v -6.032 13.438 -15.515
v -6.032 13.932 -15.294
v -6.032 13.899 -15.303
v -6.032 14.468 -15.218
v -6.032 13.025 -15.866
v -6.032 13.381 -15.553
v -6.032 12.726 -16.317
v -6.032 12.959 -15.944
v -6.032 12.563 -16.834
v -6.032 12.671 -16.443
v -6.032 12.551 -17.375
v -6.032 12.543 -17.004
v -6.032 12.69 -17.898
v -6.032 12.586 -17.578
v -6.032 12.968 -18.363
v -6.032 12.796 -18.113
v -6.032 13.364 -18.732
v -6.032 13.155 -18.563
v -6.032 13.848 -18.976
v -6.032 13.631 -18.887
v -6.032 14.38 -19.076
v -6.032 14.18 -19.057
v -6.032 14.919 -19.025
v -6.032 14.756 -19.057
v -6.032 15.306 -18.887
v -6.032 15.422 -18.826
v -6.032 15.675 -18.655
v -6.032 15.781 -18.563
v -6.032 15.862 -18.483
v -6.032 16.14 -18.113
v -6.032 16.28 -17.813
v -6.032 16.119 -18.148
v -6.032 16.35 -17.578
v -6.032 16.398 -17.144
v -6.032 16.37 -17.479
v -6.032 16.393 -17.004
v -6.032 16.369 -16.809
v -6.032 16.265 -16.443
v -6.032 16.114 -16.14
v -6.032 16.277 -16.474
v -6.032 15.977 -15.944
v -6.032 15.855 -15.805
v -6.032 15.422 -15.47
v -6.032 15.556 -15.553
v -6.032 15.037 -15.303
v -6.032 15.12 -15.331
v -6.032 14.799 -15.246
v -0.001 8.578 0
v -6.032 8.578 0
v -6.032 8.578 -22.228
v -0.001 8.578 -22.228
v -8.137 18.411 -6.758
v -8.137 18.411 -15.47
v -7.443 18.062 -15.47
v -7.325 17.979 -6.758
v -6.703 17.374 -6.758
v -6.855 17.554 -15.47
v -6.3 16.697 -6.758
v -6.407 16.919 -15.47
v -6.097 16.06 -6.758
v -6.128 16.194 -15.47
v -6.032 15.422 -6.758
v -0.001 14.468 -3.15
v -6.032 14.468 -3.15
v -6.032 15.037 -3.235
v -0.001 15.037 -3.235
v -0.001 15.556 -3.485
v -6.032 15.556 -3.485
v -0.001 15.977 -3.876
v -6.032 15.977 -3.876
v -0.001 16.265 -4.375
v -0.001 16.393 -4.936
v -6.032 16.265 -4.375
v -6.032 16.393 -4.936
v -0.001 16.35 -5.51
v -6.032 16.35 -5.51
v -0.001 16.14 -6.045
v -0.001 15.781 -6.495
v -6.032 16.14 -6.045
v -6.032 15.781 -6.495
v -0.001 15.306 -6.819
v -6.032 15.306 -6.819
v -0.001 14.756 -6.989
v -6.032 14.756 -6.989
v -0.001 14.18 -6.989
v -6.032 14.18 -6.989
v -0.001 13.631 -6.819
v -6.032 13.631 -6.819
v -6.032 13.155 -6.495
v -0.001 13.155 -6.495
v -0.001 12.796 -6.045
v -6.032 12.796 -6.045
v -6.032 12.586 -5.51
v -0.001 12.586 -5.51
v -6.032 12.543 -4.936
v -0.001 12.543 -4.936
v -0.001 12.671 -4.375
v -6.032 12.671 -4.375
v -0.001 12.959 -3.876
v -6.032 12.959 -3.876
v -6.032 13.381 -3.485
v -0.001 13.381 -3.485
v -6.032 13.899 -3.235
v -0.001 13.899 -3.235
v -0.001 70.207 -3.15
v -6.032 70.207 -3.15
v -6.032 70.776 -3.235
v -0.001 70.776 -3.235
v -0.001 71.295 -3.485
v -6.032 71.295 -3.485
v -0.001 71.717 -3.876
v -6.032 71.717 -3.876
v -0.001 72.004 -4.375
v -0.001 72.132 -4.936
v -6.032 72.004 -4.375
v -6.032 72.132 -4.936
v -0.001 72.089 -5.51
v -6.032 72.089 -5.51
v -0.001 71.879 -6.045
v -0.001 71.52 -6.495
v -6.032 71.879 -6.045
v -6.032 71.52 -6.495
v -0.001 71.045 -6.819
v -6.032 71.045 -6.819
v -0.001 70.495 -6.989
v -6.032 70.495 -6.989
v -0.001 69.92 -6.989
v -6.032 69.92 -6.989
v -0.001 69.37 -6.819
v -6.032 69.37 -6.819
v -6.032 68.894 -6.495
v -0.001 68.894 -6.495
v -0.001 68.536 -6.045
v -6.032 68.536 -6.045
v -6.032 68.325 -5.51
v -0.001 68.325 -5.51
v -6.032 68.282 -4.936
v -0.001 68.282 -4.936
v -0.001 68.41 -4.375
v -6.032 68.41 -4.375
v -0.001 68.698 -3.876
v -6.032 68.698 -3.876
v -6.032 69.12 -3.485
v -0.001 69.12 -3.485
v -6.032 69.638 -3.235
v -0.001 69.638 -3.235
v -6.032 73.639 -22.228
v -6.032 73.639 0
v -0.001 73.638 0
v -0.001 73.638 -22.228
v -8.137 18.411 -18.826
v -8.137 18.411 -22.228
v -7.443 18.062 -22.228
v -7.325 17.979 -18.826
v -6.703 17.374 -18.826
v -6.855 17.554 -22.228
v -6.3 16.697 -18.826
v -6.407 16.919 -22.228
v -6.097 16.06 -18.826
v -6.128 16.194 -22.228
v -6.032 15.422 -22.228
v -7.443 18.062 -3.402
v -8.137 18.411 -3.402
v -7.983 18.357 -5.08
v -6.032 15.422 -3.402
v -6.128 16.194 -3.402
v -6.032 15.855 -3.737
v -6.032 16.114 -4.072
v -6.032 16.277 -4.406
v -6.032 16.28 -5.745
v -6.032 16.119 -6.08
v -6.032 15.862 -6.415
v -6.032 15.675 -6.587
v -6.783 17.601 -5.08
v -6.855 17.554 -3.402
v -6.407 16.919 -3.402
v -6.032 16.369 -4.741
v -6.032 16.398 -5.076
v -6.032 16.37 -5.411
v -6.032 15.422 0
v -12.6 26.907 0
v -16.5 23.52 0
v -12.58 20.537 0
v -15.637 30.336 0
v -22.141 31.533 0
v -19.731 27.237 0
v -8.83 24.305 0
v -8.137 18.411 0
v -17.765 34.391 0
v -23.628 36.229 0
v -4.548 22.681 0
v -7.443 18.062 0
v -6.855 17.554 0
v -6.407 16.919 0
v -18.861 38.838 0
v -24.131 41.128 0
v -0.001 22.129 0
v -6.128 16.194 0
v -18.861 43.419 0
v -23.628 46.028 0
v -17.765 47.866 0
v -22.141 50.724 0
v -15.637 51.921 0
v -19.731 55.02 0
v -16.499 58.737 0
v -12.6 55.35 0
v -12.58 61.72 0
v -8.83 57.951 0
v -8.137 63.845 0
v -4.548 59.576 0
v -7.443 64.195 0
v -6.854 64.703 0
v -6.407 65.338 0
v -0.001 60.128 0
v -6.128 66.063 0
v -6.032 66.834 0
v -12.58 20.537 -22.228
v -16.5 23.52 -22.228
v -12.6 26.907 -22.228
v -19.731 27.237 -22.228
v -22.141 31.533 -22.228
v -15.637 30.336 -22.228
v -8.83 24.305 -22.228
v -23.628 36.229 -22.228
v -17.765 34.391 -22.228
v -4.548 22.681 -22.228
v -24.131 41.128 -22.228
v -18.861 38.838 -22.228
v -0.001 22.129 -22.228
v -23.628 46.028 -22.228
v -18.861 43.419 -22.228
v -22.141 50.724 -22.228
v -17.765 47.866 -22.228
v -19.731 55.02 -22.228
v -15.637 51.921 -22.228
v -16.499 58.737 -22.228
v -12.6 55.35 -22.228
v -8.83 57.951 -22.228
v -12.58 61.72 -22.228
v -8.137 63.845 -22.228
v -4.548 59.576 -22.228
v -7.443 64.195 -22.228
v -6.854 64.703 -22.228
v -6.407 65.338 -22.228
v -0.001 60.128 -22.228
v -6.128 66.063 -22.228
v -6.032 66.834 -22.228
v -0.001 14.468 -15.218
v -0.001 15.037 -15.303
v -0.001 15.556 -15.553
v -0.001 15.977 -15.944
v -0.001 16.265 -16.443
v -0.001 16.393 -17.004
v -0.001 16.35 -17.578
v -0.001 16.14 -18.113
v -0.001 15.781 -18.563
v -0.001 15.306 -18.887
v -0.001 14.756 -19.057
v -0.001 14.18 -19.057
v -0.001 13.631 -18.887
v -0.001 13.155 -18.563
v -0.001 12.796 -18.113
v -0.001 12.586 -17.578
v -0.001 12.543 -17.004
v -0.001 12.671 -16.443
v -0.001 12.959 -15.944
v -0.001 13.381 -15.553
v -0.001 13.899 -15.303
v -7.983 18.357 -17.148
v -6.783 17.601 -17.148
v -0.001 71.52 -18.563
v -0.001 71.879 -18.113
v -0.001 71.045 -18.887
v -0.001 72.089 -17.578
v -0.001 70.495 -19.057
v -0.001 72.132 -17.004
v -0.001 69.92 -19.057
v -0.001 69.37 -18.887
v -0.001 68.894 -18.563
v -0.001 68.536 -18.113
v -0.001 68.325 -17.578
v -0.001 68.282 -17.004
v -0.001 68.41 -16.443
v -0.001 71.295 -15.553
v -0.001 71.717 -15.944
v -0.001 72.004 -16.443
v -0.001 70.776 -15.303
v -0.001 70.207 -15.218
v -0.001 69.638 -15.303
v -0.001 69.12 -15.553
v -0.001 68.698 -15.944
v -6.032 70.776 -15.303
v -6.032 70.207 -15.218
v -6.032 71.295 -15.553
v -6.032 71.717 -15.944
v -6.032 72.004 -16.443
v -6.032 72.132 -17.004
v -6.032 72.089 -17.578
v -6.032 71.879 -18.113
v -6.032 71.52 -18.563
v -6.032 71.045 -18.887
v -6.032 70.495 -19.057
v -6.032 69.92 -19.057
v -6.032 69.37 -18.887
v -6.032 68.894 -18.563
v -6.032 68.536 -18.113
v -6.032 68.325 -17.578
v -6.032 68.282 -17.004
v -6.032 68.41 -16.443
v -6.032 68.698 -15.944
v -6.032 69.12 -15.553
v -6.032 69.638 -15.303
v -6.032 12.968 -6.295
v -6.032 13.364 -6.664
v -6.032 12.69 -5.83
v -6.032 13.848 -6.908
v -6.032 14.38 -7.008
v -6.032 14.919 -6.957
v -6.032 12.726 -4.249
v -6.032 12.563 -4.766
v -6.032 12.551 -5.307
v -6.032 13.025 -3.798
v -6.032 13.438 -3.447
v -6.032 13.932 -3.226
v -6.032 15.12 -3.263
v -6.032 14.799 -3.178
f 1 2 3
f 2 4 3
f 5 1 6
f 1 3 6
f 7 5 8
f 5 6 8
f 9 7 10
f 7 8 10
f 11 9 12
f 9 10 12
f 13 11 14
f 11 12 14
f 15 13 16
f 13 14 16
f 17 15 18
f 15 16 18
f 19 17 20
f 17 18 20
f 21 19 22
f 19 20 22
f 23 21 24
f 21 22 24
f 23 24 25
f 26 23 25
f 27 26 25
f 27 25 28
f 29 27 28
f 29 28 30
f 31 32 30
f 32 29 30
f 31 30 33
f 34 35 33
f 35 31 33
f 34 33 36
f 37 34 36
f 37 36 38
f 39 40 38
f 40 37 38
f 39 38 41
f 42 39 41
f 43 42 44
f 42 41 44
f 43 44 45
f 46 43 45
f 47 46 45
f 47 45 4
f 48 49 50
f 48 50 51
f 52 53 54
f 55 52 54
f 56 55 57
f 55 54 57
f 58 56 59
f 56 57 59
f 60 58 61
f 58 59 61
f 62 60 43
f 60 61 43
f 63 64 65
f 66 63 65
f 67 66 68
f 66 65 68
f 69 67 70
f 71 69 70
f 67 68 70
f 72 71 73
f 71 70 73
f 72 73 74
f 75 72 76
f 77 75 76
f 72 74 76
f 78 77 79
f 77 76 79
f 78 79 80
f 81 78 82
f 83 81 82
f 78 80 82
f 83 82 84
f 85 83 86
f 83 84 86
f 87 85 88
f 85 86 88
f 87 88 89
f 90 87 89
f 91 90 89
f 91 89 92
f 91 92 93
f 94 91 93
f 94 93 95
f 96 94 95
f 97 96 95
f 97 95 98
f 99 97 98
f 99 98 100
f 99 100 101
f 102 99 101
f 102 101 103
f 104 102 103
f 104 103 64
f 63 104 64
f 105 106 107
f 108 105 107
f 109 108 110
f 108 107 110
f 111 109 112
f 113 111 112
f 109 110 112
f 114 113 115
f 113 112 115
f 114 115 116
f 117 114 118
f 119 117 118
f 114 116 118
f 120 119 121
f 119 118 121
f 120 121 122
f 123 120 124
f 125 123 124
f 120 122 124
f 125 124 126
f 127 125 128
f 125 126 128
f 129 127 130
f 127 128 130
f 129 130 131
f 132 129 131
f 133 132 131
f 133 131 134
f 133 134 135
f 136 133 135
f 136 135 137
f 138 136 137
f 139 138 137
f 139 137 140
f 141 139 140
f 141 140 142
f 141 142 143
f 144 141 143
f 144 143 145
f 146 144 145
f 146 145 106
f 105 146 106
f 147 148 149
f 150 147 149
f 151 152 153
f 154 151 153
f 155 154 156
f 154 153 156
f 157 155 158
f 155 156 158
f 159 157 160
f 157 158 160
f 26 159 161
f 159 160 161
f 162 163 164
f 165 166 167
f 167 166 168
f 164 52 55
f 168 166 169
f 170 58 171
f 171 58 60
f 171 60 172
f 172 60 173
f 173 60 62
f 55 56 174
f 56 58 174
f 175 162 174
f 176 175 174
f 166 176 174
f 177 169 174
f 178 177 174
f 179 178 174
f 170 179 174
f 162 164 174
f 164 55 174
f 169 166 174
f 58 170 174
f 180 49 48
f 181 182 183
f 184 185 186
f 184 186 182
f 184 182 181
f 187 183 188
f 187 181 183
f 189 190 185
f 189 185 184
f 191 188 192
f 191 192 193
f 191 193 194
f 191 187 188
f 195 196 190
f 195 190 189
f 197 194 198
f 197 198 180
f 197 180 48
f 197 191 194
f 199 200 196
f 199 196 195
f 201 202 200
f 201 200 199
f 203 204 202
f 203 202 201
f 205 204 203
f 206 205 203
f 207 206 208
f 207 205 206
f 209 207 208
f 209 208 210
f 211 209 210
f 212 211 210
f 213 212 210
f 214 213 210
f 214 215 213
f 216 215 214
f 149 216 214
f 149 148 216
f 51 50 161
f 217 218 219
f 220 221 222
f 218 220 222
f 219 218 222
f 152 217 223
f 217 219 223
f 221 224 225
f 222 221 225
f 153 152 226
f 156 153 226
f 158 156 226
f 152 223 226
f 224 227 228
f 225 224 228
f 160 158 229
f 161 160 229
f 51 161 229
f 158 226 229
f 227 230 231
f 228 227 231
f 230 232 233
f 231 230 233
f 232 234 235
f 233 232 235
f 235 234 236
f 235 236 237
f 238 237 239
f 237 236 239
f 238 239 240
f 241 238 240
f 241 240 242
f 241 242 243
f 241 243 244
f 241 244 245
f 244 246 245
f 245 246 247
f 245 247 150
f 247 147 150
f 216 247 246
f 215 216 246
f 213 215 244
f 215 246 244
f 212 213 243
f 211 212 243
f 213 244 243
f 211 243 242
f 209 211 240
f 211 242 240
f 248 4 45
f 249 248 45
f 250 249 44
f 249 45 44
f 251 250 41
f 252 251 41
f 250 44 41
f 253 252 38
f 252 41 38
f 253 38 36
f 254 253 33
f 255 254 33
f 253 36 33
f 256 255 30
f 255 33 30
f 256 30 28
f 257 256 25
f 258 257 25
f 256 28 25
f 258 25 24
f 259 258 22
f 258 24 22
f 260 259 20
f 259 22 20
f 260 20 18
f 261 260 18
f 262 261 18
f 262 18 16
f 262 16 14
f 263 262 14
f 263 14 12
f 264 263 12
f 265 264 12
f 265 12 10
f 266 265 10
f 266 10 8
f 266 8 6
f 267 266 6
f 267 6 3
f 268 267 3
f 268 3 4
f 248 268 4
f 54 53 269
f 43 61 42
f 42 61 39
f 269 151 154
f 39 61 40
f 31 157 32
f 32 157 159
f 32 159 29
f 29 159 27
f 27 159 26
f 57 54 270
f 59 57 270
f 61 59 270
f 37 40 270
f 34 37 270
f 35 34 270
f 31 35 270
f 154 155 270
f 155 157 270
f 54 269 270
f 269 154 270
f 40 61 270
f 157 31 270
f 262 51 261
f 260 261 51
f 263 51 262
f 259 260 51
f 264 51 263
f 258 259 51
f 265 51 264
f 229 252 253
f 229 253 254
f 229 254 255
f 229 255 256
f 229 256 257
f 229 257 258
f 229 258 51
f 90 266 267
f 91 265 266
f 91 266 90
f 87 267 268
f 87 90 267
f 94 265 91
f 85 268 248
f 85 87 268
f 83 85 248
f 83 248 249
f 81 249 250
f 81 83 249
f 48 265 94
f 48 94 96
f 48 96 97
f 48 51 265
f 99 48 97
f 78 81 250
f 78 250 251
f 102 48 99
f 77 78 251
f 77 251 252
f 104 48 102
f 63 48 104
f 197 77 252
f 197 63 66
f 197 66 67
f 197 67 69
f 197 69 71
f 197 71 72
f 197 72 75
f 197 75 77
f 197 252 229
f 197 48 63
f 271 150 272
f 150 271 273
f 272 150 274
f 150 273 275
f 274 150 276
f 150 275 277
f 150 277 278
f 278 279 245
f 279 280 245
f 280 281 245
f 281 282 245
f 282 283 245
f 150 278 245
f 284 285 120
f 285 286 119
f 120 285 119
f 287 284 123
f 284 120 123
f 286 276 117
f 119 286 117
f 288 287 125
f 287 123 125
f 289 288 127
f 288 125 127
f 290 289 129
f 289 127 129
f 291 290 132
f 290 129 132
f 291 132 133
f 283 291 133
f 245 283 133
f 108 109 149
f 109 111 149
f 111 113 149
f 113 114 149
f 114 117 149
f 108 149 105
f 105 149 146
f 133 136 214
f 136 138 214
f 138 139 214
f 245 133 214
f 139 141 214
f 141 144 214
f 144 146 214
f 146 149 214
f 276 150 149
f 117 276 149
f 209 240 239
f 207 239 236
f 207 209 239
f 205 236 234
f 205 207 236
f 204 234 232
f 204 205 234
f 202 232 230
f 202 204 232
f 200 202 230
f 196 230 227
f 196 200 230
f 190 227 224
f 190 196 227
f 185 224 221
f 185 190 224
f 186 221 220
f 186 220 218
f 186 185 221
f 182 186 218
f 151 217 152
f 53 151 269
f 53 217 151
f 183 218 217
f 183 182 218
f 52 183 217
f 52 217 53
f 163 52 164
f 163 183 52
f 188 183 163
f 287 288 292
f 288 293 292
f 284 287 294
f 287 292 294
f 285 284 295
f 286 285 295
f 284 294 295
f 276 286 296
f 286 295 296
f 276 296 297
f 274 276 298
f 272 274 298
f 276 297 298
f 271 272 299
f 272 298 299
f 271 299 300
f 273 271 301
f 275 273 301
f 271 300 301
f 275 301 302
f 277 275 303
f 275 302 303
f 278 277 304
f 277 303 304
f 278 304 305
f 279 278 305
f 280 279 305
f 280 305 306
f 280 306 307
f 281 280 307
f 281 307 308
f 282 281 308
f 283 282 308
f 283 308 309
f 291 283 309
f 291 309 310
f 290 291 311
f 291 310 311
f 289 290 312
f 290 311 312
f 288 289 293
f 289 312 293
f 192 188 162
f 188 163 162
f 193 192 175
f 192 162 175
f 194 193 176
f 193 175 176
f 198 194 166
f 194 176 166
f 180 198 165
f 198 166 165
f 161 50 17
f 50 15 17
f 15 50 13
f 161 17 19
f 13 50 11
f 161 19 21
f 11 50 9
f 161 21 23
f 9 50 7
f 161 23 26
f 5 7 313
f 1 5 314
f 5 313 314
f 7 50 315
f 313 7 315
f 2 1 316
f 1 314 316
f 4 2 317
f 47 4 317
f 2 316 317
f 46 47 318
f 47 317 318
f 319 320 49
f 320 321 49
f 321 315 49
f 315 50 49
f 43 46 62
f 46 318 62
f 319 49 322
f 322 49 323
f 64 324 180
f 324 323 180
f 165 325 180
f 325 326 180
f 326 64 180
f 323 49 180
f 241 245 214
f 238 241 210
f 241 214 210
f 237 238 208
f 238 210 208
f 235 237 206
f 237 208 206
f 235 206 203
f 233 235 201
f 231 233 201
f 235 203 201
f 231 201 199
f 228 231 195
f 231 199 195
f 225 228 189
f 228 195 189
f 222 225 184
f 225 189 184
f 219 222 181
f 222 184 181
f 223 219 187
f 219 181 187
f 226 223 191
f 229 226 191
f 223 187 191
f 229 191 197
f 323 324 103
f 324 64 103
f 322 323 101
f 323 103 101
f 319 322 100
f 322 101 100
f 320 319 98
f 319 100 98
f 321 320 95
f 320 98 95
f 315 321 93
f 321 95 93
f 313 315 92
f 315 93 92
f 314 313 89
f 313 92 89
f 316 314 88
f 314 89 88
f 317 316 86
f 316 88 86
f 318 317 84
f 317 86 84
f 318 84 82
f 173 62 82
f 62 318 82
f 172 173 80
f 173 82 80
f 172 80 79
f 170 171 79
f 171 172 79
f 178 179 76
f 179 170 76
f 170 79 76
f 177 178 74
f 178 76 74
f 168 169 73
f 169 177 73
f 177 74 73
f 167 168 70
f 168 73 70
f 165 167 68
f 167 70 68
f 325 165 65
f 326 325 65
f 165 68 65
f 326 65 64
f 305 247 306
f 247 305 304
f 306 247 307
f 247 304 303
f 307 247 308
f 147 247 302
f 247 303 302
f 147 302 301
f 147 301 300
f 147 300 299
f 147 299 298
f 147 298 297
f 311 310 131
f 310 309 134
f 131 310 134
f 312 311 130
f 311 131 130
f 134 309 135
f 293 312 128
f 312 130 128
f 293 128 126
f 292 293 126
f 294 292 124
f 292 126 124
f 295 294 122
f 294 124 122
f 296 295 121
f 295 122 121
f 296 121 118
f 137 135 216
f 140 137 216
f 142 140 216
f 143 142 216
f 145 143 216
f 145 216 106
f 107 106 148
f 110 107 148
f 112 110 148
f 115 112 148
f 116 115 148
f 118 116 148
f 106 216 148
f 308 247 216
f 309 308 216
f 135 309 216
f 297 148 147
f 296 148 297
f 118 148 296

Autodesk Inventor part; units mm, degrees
ref_plane "YZ Plane" through (0, 0, 0) normal (1, 0, 0) x (0, 1, 0)
ref_plane "XZ Plane" through (0, 0, 0) normal (0, 1, 0) x (-1, 0, 0)
ref_plane "Work Plane1" through (0, 0, 0) normal (0, 0, 1) x (1, 0, 0)
sketch "Sketch1" plane through (0, 0, 0) normal (0, 0, 1) x (1, 0, 0)
  arc A0 (18.9992, 41.108) -> (0, 60.0877) centre (-0.0008, 41.0877) ccw construction
  arc A1 (0, 22.1284) -> (18.9992, 41.108) centre (-0.0008, 41.1284) ccw construction
  arc A2 (44.3468, 60.0877) -> (25.3476, 41.108) centre (44.3476, 41.0877) ccw construction
  arc A3 (25.3476, 41.108) -> (44.3468, 22.1284) centre (44.3476, 41.1284) ccw construction
  line L0 (10.16, 73.6386) -> (5.7912, 73.6386) construction
  line L1 (0, 77.677) -> (0, 67.7202) construction
  line L2 (5.7912, 73.6386) -> (13.9012, 73.6386) construction
  line L3 (-25.35, 77.677) -> (-25.35, 84.027) projected
  line L4 (-25.35, -6.35) -> (-25.35, 0) projected
  line L5 (-25.35, 77.677) -> (-25.35, 0) construction
  arc A4 (-6.0324, 64.4924) -> (-6.0325, 17.7644) centre (-0.0008, 41.1284) ccw
  arc A5 (-6.0324, 64.4924) -> (-6.0325, 17.7644) centre (-0.0008, 41.1284) ccw
  arc A6 (-0.0008, 60.1276) -> (-0.0008, 22.1292) centre (-0.0008, 41.1284) ccw
  line L6 (-6.0324, 64.4924) -> (-6.0324, 73.6386)
  line L7 (-6.0324, 73.6386) -> (-0.0008, 73.6385)
  line L8 (10.16, 8.5775) -> (5.7912, 8.5775) construction
  line L9 (-6.0325, 8.5775) -> (-0.0008, 8.5775)
  line L10 (-6.0325, 8.5775) -> (-6.0325, 17.7644)
  line L11 (-0.0008, 73.6385) -> (-0.0008, 60.1276)
  line L12 (-0.0008, 8.5775) -> (-0.0008, 22.1292)
  point P0 (0, 0)
  dimension "d12" = 18.9992
  dimension "d13" = 24.13
  dimension "d19" = 6.0317
  dimension "d22" = 6.0317
  dimension "d23" = 0
  dimension "d24" = 0
ref_plane "Work Plane2" through (0, 17.6708, -22.228) normal (0, 0, -1) x (0, 1, 0)
extrude "Extrusion1" add sketch "Sketch1" against normal up to surface (22.228 mm away)
sketch "Sketch2" plane through (-6.0324, 64.4924, 0) normal (-1, 0, 0) x (0, 0, 1)
  circle A0 centre (-17.148, 5.715) radius 1.9304
  circle A1 centre (-5.08, 5.715) radius 1.9304
  circle A2 centre (-5.08, -50.0243) radius 1.9304
  circle A3 centre (-17.148, -50.0243) radius 1.9304
  point P0 (0, -64.4924)
extrude "Extrusion2" cut sketch "Sketch2" along normal mid plane 25.4
fillet "Fillet1" radius 3.175 1 edges at (-6.0324, 64.4924, -11.114)
fillet "Fillet2" radius 3.175 1 edges at (-6.0325, 17.7644, -11.114)
equation "\"d19\" = d18"
equation "\"d18\" = 6.031656"
properties part number "motor mount cap-10"
